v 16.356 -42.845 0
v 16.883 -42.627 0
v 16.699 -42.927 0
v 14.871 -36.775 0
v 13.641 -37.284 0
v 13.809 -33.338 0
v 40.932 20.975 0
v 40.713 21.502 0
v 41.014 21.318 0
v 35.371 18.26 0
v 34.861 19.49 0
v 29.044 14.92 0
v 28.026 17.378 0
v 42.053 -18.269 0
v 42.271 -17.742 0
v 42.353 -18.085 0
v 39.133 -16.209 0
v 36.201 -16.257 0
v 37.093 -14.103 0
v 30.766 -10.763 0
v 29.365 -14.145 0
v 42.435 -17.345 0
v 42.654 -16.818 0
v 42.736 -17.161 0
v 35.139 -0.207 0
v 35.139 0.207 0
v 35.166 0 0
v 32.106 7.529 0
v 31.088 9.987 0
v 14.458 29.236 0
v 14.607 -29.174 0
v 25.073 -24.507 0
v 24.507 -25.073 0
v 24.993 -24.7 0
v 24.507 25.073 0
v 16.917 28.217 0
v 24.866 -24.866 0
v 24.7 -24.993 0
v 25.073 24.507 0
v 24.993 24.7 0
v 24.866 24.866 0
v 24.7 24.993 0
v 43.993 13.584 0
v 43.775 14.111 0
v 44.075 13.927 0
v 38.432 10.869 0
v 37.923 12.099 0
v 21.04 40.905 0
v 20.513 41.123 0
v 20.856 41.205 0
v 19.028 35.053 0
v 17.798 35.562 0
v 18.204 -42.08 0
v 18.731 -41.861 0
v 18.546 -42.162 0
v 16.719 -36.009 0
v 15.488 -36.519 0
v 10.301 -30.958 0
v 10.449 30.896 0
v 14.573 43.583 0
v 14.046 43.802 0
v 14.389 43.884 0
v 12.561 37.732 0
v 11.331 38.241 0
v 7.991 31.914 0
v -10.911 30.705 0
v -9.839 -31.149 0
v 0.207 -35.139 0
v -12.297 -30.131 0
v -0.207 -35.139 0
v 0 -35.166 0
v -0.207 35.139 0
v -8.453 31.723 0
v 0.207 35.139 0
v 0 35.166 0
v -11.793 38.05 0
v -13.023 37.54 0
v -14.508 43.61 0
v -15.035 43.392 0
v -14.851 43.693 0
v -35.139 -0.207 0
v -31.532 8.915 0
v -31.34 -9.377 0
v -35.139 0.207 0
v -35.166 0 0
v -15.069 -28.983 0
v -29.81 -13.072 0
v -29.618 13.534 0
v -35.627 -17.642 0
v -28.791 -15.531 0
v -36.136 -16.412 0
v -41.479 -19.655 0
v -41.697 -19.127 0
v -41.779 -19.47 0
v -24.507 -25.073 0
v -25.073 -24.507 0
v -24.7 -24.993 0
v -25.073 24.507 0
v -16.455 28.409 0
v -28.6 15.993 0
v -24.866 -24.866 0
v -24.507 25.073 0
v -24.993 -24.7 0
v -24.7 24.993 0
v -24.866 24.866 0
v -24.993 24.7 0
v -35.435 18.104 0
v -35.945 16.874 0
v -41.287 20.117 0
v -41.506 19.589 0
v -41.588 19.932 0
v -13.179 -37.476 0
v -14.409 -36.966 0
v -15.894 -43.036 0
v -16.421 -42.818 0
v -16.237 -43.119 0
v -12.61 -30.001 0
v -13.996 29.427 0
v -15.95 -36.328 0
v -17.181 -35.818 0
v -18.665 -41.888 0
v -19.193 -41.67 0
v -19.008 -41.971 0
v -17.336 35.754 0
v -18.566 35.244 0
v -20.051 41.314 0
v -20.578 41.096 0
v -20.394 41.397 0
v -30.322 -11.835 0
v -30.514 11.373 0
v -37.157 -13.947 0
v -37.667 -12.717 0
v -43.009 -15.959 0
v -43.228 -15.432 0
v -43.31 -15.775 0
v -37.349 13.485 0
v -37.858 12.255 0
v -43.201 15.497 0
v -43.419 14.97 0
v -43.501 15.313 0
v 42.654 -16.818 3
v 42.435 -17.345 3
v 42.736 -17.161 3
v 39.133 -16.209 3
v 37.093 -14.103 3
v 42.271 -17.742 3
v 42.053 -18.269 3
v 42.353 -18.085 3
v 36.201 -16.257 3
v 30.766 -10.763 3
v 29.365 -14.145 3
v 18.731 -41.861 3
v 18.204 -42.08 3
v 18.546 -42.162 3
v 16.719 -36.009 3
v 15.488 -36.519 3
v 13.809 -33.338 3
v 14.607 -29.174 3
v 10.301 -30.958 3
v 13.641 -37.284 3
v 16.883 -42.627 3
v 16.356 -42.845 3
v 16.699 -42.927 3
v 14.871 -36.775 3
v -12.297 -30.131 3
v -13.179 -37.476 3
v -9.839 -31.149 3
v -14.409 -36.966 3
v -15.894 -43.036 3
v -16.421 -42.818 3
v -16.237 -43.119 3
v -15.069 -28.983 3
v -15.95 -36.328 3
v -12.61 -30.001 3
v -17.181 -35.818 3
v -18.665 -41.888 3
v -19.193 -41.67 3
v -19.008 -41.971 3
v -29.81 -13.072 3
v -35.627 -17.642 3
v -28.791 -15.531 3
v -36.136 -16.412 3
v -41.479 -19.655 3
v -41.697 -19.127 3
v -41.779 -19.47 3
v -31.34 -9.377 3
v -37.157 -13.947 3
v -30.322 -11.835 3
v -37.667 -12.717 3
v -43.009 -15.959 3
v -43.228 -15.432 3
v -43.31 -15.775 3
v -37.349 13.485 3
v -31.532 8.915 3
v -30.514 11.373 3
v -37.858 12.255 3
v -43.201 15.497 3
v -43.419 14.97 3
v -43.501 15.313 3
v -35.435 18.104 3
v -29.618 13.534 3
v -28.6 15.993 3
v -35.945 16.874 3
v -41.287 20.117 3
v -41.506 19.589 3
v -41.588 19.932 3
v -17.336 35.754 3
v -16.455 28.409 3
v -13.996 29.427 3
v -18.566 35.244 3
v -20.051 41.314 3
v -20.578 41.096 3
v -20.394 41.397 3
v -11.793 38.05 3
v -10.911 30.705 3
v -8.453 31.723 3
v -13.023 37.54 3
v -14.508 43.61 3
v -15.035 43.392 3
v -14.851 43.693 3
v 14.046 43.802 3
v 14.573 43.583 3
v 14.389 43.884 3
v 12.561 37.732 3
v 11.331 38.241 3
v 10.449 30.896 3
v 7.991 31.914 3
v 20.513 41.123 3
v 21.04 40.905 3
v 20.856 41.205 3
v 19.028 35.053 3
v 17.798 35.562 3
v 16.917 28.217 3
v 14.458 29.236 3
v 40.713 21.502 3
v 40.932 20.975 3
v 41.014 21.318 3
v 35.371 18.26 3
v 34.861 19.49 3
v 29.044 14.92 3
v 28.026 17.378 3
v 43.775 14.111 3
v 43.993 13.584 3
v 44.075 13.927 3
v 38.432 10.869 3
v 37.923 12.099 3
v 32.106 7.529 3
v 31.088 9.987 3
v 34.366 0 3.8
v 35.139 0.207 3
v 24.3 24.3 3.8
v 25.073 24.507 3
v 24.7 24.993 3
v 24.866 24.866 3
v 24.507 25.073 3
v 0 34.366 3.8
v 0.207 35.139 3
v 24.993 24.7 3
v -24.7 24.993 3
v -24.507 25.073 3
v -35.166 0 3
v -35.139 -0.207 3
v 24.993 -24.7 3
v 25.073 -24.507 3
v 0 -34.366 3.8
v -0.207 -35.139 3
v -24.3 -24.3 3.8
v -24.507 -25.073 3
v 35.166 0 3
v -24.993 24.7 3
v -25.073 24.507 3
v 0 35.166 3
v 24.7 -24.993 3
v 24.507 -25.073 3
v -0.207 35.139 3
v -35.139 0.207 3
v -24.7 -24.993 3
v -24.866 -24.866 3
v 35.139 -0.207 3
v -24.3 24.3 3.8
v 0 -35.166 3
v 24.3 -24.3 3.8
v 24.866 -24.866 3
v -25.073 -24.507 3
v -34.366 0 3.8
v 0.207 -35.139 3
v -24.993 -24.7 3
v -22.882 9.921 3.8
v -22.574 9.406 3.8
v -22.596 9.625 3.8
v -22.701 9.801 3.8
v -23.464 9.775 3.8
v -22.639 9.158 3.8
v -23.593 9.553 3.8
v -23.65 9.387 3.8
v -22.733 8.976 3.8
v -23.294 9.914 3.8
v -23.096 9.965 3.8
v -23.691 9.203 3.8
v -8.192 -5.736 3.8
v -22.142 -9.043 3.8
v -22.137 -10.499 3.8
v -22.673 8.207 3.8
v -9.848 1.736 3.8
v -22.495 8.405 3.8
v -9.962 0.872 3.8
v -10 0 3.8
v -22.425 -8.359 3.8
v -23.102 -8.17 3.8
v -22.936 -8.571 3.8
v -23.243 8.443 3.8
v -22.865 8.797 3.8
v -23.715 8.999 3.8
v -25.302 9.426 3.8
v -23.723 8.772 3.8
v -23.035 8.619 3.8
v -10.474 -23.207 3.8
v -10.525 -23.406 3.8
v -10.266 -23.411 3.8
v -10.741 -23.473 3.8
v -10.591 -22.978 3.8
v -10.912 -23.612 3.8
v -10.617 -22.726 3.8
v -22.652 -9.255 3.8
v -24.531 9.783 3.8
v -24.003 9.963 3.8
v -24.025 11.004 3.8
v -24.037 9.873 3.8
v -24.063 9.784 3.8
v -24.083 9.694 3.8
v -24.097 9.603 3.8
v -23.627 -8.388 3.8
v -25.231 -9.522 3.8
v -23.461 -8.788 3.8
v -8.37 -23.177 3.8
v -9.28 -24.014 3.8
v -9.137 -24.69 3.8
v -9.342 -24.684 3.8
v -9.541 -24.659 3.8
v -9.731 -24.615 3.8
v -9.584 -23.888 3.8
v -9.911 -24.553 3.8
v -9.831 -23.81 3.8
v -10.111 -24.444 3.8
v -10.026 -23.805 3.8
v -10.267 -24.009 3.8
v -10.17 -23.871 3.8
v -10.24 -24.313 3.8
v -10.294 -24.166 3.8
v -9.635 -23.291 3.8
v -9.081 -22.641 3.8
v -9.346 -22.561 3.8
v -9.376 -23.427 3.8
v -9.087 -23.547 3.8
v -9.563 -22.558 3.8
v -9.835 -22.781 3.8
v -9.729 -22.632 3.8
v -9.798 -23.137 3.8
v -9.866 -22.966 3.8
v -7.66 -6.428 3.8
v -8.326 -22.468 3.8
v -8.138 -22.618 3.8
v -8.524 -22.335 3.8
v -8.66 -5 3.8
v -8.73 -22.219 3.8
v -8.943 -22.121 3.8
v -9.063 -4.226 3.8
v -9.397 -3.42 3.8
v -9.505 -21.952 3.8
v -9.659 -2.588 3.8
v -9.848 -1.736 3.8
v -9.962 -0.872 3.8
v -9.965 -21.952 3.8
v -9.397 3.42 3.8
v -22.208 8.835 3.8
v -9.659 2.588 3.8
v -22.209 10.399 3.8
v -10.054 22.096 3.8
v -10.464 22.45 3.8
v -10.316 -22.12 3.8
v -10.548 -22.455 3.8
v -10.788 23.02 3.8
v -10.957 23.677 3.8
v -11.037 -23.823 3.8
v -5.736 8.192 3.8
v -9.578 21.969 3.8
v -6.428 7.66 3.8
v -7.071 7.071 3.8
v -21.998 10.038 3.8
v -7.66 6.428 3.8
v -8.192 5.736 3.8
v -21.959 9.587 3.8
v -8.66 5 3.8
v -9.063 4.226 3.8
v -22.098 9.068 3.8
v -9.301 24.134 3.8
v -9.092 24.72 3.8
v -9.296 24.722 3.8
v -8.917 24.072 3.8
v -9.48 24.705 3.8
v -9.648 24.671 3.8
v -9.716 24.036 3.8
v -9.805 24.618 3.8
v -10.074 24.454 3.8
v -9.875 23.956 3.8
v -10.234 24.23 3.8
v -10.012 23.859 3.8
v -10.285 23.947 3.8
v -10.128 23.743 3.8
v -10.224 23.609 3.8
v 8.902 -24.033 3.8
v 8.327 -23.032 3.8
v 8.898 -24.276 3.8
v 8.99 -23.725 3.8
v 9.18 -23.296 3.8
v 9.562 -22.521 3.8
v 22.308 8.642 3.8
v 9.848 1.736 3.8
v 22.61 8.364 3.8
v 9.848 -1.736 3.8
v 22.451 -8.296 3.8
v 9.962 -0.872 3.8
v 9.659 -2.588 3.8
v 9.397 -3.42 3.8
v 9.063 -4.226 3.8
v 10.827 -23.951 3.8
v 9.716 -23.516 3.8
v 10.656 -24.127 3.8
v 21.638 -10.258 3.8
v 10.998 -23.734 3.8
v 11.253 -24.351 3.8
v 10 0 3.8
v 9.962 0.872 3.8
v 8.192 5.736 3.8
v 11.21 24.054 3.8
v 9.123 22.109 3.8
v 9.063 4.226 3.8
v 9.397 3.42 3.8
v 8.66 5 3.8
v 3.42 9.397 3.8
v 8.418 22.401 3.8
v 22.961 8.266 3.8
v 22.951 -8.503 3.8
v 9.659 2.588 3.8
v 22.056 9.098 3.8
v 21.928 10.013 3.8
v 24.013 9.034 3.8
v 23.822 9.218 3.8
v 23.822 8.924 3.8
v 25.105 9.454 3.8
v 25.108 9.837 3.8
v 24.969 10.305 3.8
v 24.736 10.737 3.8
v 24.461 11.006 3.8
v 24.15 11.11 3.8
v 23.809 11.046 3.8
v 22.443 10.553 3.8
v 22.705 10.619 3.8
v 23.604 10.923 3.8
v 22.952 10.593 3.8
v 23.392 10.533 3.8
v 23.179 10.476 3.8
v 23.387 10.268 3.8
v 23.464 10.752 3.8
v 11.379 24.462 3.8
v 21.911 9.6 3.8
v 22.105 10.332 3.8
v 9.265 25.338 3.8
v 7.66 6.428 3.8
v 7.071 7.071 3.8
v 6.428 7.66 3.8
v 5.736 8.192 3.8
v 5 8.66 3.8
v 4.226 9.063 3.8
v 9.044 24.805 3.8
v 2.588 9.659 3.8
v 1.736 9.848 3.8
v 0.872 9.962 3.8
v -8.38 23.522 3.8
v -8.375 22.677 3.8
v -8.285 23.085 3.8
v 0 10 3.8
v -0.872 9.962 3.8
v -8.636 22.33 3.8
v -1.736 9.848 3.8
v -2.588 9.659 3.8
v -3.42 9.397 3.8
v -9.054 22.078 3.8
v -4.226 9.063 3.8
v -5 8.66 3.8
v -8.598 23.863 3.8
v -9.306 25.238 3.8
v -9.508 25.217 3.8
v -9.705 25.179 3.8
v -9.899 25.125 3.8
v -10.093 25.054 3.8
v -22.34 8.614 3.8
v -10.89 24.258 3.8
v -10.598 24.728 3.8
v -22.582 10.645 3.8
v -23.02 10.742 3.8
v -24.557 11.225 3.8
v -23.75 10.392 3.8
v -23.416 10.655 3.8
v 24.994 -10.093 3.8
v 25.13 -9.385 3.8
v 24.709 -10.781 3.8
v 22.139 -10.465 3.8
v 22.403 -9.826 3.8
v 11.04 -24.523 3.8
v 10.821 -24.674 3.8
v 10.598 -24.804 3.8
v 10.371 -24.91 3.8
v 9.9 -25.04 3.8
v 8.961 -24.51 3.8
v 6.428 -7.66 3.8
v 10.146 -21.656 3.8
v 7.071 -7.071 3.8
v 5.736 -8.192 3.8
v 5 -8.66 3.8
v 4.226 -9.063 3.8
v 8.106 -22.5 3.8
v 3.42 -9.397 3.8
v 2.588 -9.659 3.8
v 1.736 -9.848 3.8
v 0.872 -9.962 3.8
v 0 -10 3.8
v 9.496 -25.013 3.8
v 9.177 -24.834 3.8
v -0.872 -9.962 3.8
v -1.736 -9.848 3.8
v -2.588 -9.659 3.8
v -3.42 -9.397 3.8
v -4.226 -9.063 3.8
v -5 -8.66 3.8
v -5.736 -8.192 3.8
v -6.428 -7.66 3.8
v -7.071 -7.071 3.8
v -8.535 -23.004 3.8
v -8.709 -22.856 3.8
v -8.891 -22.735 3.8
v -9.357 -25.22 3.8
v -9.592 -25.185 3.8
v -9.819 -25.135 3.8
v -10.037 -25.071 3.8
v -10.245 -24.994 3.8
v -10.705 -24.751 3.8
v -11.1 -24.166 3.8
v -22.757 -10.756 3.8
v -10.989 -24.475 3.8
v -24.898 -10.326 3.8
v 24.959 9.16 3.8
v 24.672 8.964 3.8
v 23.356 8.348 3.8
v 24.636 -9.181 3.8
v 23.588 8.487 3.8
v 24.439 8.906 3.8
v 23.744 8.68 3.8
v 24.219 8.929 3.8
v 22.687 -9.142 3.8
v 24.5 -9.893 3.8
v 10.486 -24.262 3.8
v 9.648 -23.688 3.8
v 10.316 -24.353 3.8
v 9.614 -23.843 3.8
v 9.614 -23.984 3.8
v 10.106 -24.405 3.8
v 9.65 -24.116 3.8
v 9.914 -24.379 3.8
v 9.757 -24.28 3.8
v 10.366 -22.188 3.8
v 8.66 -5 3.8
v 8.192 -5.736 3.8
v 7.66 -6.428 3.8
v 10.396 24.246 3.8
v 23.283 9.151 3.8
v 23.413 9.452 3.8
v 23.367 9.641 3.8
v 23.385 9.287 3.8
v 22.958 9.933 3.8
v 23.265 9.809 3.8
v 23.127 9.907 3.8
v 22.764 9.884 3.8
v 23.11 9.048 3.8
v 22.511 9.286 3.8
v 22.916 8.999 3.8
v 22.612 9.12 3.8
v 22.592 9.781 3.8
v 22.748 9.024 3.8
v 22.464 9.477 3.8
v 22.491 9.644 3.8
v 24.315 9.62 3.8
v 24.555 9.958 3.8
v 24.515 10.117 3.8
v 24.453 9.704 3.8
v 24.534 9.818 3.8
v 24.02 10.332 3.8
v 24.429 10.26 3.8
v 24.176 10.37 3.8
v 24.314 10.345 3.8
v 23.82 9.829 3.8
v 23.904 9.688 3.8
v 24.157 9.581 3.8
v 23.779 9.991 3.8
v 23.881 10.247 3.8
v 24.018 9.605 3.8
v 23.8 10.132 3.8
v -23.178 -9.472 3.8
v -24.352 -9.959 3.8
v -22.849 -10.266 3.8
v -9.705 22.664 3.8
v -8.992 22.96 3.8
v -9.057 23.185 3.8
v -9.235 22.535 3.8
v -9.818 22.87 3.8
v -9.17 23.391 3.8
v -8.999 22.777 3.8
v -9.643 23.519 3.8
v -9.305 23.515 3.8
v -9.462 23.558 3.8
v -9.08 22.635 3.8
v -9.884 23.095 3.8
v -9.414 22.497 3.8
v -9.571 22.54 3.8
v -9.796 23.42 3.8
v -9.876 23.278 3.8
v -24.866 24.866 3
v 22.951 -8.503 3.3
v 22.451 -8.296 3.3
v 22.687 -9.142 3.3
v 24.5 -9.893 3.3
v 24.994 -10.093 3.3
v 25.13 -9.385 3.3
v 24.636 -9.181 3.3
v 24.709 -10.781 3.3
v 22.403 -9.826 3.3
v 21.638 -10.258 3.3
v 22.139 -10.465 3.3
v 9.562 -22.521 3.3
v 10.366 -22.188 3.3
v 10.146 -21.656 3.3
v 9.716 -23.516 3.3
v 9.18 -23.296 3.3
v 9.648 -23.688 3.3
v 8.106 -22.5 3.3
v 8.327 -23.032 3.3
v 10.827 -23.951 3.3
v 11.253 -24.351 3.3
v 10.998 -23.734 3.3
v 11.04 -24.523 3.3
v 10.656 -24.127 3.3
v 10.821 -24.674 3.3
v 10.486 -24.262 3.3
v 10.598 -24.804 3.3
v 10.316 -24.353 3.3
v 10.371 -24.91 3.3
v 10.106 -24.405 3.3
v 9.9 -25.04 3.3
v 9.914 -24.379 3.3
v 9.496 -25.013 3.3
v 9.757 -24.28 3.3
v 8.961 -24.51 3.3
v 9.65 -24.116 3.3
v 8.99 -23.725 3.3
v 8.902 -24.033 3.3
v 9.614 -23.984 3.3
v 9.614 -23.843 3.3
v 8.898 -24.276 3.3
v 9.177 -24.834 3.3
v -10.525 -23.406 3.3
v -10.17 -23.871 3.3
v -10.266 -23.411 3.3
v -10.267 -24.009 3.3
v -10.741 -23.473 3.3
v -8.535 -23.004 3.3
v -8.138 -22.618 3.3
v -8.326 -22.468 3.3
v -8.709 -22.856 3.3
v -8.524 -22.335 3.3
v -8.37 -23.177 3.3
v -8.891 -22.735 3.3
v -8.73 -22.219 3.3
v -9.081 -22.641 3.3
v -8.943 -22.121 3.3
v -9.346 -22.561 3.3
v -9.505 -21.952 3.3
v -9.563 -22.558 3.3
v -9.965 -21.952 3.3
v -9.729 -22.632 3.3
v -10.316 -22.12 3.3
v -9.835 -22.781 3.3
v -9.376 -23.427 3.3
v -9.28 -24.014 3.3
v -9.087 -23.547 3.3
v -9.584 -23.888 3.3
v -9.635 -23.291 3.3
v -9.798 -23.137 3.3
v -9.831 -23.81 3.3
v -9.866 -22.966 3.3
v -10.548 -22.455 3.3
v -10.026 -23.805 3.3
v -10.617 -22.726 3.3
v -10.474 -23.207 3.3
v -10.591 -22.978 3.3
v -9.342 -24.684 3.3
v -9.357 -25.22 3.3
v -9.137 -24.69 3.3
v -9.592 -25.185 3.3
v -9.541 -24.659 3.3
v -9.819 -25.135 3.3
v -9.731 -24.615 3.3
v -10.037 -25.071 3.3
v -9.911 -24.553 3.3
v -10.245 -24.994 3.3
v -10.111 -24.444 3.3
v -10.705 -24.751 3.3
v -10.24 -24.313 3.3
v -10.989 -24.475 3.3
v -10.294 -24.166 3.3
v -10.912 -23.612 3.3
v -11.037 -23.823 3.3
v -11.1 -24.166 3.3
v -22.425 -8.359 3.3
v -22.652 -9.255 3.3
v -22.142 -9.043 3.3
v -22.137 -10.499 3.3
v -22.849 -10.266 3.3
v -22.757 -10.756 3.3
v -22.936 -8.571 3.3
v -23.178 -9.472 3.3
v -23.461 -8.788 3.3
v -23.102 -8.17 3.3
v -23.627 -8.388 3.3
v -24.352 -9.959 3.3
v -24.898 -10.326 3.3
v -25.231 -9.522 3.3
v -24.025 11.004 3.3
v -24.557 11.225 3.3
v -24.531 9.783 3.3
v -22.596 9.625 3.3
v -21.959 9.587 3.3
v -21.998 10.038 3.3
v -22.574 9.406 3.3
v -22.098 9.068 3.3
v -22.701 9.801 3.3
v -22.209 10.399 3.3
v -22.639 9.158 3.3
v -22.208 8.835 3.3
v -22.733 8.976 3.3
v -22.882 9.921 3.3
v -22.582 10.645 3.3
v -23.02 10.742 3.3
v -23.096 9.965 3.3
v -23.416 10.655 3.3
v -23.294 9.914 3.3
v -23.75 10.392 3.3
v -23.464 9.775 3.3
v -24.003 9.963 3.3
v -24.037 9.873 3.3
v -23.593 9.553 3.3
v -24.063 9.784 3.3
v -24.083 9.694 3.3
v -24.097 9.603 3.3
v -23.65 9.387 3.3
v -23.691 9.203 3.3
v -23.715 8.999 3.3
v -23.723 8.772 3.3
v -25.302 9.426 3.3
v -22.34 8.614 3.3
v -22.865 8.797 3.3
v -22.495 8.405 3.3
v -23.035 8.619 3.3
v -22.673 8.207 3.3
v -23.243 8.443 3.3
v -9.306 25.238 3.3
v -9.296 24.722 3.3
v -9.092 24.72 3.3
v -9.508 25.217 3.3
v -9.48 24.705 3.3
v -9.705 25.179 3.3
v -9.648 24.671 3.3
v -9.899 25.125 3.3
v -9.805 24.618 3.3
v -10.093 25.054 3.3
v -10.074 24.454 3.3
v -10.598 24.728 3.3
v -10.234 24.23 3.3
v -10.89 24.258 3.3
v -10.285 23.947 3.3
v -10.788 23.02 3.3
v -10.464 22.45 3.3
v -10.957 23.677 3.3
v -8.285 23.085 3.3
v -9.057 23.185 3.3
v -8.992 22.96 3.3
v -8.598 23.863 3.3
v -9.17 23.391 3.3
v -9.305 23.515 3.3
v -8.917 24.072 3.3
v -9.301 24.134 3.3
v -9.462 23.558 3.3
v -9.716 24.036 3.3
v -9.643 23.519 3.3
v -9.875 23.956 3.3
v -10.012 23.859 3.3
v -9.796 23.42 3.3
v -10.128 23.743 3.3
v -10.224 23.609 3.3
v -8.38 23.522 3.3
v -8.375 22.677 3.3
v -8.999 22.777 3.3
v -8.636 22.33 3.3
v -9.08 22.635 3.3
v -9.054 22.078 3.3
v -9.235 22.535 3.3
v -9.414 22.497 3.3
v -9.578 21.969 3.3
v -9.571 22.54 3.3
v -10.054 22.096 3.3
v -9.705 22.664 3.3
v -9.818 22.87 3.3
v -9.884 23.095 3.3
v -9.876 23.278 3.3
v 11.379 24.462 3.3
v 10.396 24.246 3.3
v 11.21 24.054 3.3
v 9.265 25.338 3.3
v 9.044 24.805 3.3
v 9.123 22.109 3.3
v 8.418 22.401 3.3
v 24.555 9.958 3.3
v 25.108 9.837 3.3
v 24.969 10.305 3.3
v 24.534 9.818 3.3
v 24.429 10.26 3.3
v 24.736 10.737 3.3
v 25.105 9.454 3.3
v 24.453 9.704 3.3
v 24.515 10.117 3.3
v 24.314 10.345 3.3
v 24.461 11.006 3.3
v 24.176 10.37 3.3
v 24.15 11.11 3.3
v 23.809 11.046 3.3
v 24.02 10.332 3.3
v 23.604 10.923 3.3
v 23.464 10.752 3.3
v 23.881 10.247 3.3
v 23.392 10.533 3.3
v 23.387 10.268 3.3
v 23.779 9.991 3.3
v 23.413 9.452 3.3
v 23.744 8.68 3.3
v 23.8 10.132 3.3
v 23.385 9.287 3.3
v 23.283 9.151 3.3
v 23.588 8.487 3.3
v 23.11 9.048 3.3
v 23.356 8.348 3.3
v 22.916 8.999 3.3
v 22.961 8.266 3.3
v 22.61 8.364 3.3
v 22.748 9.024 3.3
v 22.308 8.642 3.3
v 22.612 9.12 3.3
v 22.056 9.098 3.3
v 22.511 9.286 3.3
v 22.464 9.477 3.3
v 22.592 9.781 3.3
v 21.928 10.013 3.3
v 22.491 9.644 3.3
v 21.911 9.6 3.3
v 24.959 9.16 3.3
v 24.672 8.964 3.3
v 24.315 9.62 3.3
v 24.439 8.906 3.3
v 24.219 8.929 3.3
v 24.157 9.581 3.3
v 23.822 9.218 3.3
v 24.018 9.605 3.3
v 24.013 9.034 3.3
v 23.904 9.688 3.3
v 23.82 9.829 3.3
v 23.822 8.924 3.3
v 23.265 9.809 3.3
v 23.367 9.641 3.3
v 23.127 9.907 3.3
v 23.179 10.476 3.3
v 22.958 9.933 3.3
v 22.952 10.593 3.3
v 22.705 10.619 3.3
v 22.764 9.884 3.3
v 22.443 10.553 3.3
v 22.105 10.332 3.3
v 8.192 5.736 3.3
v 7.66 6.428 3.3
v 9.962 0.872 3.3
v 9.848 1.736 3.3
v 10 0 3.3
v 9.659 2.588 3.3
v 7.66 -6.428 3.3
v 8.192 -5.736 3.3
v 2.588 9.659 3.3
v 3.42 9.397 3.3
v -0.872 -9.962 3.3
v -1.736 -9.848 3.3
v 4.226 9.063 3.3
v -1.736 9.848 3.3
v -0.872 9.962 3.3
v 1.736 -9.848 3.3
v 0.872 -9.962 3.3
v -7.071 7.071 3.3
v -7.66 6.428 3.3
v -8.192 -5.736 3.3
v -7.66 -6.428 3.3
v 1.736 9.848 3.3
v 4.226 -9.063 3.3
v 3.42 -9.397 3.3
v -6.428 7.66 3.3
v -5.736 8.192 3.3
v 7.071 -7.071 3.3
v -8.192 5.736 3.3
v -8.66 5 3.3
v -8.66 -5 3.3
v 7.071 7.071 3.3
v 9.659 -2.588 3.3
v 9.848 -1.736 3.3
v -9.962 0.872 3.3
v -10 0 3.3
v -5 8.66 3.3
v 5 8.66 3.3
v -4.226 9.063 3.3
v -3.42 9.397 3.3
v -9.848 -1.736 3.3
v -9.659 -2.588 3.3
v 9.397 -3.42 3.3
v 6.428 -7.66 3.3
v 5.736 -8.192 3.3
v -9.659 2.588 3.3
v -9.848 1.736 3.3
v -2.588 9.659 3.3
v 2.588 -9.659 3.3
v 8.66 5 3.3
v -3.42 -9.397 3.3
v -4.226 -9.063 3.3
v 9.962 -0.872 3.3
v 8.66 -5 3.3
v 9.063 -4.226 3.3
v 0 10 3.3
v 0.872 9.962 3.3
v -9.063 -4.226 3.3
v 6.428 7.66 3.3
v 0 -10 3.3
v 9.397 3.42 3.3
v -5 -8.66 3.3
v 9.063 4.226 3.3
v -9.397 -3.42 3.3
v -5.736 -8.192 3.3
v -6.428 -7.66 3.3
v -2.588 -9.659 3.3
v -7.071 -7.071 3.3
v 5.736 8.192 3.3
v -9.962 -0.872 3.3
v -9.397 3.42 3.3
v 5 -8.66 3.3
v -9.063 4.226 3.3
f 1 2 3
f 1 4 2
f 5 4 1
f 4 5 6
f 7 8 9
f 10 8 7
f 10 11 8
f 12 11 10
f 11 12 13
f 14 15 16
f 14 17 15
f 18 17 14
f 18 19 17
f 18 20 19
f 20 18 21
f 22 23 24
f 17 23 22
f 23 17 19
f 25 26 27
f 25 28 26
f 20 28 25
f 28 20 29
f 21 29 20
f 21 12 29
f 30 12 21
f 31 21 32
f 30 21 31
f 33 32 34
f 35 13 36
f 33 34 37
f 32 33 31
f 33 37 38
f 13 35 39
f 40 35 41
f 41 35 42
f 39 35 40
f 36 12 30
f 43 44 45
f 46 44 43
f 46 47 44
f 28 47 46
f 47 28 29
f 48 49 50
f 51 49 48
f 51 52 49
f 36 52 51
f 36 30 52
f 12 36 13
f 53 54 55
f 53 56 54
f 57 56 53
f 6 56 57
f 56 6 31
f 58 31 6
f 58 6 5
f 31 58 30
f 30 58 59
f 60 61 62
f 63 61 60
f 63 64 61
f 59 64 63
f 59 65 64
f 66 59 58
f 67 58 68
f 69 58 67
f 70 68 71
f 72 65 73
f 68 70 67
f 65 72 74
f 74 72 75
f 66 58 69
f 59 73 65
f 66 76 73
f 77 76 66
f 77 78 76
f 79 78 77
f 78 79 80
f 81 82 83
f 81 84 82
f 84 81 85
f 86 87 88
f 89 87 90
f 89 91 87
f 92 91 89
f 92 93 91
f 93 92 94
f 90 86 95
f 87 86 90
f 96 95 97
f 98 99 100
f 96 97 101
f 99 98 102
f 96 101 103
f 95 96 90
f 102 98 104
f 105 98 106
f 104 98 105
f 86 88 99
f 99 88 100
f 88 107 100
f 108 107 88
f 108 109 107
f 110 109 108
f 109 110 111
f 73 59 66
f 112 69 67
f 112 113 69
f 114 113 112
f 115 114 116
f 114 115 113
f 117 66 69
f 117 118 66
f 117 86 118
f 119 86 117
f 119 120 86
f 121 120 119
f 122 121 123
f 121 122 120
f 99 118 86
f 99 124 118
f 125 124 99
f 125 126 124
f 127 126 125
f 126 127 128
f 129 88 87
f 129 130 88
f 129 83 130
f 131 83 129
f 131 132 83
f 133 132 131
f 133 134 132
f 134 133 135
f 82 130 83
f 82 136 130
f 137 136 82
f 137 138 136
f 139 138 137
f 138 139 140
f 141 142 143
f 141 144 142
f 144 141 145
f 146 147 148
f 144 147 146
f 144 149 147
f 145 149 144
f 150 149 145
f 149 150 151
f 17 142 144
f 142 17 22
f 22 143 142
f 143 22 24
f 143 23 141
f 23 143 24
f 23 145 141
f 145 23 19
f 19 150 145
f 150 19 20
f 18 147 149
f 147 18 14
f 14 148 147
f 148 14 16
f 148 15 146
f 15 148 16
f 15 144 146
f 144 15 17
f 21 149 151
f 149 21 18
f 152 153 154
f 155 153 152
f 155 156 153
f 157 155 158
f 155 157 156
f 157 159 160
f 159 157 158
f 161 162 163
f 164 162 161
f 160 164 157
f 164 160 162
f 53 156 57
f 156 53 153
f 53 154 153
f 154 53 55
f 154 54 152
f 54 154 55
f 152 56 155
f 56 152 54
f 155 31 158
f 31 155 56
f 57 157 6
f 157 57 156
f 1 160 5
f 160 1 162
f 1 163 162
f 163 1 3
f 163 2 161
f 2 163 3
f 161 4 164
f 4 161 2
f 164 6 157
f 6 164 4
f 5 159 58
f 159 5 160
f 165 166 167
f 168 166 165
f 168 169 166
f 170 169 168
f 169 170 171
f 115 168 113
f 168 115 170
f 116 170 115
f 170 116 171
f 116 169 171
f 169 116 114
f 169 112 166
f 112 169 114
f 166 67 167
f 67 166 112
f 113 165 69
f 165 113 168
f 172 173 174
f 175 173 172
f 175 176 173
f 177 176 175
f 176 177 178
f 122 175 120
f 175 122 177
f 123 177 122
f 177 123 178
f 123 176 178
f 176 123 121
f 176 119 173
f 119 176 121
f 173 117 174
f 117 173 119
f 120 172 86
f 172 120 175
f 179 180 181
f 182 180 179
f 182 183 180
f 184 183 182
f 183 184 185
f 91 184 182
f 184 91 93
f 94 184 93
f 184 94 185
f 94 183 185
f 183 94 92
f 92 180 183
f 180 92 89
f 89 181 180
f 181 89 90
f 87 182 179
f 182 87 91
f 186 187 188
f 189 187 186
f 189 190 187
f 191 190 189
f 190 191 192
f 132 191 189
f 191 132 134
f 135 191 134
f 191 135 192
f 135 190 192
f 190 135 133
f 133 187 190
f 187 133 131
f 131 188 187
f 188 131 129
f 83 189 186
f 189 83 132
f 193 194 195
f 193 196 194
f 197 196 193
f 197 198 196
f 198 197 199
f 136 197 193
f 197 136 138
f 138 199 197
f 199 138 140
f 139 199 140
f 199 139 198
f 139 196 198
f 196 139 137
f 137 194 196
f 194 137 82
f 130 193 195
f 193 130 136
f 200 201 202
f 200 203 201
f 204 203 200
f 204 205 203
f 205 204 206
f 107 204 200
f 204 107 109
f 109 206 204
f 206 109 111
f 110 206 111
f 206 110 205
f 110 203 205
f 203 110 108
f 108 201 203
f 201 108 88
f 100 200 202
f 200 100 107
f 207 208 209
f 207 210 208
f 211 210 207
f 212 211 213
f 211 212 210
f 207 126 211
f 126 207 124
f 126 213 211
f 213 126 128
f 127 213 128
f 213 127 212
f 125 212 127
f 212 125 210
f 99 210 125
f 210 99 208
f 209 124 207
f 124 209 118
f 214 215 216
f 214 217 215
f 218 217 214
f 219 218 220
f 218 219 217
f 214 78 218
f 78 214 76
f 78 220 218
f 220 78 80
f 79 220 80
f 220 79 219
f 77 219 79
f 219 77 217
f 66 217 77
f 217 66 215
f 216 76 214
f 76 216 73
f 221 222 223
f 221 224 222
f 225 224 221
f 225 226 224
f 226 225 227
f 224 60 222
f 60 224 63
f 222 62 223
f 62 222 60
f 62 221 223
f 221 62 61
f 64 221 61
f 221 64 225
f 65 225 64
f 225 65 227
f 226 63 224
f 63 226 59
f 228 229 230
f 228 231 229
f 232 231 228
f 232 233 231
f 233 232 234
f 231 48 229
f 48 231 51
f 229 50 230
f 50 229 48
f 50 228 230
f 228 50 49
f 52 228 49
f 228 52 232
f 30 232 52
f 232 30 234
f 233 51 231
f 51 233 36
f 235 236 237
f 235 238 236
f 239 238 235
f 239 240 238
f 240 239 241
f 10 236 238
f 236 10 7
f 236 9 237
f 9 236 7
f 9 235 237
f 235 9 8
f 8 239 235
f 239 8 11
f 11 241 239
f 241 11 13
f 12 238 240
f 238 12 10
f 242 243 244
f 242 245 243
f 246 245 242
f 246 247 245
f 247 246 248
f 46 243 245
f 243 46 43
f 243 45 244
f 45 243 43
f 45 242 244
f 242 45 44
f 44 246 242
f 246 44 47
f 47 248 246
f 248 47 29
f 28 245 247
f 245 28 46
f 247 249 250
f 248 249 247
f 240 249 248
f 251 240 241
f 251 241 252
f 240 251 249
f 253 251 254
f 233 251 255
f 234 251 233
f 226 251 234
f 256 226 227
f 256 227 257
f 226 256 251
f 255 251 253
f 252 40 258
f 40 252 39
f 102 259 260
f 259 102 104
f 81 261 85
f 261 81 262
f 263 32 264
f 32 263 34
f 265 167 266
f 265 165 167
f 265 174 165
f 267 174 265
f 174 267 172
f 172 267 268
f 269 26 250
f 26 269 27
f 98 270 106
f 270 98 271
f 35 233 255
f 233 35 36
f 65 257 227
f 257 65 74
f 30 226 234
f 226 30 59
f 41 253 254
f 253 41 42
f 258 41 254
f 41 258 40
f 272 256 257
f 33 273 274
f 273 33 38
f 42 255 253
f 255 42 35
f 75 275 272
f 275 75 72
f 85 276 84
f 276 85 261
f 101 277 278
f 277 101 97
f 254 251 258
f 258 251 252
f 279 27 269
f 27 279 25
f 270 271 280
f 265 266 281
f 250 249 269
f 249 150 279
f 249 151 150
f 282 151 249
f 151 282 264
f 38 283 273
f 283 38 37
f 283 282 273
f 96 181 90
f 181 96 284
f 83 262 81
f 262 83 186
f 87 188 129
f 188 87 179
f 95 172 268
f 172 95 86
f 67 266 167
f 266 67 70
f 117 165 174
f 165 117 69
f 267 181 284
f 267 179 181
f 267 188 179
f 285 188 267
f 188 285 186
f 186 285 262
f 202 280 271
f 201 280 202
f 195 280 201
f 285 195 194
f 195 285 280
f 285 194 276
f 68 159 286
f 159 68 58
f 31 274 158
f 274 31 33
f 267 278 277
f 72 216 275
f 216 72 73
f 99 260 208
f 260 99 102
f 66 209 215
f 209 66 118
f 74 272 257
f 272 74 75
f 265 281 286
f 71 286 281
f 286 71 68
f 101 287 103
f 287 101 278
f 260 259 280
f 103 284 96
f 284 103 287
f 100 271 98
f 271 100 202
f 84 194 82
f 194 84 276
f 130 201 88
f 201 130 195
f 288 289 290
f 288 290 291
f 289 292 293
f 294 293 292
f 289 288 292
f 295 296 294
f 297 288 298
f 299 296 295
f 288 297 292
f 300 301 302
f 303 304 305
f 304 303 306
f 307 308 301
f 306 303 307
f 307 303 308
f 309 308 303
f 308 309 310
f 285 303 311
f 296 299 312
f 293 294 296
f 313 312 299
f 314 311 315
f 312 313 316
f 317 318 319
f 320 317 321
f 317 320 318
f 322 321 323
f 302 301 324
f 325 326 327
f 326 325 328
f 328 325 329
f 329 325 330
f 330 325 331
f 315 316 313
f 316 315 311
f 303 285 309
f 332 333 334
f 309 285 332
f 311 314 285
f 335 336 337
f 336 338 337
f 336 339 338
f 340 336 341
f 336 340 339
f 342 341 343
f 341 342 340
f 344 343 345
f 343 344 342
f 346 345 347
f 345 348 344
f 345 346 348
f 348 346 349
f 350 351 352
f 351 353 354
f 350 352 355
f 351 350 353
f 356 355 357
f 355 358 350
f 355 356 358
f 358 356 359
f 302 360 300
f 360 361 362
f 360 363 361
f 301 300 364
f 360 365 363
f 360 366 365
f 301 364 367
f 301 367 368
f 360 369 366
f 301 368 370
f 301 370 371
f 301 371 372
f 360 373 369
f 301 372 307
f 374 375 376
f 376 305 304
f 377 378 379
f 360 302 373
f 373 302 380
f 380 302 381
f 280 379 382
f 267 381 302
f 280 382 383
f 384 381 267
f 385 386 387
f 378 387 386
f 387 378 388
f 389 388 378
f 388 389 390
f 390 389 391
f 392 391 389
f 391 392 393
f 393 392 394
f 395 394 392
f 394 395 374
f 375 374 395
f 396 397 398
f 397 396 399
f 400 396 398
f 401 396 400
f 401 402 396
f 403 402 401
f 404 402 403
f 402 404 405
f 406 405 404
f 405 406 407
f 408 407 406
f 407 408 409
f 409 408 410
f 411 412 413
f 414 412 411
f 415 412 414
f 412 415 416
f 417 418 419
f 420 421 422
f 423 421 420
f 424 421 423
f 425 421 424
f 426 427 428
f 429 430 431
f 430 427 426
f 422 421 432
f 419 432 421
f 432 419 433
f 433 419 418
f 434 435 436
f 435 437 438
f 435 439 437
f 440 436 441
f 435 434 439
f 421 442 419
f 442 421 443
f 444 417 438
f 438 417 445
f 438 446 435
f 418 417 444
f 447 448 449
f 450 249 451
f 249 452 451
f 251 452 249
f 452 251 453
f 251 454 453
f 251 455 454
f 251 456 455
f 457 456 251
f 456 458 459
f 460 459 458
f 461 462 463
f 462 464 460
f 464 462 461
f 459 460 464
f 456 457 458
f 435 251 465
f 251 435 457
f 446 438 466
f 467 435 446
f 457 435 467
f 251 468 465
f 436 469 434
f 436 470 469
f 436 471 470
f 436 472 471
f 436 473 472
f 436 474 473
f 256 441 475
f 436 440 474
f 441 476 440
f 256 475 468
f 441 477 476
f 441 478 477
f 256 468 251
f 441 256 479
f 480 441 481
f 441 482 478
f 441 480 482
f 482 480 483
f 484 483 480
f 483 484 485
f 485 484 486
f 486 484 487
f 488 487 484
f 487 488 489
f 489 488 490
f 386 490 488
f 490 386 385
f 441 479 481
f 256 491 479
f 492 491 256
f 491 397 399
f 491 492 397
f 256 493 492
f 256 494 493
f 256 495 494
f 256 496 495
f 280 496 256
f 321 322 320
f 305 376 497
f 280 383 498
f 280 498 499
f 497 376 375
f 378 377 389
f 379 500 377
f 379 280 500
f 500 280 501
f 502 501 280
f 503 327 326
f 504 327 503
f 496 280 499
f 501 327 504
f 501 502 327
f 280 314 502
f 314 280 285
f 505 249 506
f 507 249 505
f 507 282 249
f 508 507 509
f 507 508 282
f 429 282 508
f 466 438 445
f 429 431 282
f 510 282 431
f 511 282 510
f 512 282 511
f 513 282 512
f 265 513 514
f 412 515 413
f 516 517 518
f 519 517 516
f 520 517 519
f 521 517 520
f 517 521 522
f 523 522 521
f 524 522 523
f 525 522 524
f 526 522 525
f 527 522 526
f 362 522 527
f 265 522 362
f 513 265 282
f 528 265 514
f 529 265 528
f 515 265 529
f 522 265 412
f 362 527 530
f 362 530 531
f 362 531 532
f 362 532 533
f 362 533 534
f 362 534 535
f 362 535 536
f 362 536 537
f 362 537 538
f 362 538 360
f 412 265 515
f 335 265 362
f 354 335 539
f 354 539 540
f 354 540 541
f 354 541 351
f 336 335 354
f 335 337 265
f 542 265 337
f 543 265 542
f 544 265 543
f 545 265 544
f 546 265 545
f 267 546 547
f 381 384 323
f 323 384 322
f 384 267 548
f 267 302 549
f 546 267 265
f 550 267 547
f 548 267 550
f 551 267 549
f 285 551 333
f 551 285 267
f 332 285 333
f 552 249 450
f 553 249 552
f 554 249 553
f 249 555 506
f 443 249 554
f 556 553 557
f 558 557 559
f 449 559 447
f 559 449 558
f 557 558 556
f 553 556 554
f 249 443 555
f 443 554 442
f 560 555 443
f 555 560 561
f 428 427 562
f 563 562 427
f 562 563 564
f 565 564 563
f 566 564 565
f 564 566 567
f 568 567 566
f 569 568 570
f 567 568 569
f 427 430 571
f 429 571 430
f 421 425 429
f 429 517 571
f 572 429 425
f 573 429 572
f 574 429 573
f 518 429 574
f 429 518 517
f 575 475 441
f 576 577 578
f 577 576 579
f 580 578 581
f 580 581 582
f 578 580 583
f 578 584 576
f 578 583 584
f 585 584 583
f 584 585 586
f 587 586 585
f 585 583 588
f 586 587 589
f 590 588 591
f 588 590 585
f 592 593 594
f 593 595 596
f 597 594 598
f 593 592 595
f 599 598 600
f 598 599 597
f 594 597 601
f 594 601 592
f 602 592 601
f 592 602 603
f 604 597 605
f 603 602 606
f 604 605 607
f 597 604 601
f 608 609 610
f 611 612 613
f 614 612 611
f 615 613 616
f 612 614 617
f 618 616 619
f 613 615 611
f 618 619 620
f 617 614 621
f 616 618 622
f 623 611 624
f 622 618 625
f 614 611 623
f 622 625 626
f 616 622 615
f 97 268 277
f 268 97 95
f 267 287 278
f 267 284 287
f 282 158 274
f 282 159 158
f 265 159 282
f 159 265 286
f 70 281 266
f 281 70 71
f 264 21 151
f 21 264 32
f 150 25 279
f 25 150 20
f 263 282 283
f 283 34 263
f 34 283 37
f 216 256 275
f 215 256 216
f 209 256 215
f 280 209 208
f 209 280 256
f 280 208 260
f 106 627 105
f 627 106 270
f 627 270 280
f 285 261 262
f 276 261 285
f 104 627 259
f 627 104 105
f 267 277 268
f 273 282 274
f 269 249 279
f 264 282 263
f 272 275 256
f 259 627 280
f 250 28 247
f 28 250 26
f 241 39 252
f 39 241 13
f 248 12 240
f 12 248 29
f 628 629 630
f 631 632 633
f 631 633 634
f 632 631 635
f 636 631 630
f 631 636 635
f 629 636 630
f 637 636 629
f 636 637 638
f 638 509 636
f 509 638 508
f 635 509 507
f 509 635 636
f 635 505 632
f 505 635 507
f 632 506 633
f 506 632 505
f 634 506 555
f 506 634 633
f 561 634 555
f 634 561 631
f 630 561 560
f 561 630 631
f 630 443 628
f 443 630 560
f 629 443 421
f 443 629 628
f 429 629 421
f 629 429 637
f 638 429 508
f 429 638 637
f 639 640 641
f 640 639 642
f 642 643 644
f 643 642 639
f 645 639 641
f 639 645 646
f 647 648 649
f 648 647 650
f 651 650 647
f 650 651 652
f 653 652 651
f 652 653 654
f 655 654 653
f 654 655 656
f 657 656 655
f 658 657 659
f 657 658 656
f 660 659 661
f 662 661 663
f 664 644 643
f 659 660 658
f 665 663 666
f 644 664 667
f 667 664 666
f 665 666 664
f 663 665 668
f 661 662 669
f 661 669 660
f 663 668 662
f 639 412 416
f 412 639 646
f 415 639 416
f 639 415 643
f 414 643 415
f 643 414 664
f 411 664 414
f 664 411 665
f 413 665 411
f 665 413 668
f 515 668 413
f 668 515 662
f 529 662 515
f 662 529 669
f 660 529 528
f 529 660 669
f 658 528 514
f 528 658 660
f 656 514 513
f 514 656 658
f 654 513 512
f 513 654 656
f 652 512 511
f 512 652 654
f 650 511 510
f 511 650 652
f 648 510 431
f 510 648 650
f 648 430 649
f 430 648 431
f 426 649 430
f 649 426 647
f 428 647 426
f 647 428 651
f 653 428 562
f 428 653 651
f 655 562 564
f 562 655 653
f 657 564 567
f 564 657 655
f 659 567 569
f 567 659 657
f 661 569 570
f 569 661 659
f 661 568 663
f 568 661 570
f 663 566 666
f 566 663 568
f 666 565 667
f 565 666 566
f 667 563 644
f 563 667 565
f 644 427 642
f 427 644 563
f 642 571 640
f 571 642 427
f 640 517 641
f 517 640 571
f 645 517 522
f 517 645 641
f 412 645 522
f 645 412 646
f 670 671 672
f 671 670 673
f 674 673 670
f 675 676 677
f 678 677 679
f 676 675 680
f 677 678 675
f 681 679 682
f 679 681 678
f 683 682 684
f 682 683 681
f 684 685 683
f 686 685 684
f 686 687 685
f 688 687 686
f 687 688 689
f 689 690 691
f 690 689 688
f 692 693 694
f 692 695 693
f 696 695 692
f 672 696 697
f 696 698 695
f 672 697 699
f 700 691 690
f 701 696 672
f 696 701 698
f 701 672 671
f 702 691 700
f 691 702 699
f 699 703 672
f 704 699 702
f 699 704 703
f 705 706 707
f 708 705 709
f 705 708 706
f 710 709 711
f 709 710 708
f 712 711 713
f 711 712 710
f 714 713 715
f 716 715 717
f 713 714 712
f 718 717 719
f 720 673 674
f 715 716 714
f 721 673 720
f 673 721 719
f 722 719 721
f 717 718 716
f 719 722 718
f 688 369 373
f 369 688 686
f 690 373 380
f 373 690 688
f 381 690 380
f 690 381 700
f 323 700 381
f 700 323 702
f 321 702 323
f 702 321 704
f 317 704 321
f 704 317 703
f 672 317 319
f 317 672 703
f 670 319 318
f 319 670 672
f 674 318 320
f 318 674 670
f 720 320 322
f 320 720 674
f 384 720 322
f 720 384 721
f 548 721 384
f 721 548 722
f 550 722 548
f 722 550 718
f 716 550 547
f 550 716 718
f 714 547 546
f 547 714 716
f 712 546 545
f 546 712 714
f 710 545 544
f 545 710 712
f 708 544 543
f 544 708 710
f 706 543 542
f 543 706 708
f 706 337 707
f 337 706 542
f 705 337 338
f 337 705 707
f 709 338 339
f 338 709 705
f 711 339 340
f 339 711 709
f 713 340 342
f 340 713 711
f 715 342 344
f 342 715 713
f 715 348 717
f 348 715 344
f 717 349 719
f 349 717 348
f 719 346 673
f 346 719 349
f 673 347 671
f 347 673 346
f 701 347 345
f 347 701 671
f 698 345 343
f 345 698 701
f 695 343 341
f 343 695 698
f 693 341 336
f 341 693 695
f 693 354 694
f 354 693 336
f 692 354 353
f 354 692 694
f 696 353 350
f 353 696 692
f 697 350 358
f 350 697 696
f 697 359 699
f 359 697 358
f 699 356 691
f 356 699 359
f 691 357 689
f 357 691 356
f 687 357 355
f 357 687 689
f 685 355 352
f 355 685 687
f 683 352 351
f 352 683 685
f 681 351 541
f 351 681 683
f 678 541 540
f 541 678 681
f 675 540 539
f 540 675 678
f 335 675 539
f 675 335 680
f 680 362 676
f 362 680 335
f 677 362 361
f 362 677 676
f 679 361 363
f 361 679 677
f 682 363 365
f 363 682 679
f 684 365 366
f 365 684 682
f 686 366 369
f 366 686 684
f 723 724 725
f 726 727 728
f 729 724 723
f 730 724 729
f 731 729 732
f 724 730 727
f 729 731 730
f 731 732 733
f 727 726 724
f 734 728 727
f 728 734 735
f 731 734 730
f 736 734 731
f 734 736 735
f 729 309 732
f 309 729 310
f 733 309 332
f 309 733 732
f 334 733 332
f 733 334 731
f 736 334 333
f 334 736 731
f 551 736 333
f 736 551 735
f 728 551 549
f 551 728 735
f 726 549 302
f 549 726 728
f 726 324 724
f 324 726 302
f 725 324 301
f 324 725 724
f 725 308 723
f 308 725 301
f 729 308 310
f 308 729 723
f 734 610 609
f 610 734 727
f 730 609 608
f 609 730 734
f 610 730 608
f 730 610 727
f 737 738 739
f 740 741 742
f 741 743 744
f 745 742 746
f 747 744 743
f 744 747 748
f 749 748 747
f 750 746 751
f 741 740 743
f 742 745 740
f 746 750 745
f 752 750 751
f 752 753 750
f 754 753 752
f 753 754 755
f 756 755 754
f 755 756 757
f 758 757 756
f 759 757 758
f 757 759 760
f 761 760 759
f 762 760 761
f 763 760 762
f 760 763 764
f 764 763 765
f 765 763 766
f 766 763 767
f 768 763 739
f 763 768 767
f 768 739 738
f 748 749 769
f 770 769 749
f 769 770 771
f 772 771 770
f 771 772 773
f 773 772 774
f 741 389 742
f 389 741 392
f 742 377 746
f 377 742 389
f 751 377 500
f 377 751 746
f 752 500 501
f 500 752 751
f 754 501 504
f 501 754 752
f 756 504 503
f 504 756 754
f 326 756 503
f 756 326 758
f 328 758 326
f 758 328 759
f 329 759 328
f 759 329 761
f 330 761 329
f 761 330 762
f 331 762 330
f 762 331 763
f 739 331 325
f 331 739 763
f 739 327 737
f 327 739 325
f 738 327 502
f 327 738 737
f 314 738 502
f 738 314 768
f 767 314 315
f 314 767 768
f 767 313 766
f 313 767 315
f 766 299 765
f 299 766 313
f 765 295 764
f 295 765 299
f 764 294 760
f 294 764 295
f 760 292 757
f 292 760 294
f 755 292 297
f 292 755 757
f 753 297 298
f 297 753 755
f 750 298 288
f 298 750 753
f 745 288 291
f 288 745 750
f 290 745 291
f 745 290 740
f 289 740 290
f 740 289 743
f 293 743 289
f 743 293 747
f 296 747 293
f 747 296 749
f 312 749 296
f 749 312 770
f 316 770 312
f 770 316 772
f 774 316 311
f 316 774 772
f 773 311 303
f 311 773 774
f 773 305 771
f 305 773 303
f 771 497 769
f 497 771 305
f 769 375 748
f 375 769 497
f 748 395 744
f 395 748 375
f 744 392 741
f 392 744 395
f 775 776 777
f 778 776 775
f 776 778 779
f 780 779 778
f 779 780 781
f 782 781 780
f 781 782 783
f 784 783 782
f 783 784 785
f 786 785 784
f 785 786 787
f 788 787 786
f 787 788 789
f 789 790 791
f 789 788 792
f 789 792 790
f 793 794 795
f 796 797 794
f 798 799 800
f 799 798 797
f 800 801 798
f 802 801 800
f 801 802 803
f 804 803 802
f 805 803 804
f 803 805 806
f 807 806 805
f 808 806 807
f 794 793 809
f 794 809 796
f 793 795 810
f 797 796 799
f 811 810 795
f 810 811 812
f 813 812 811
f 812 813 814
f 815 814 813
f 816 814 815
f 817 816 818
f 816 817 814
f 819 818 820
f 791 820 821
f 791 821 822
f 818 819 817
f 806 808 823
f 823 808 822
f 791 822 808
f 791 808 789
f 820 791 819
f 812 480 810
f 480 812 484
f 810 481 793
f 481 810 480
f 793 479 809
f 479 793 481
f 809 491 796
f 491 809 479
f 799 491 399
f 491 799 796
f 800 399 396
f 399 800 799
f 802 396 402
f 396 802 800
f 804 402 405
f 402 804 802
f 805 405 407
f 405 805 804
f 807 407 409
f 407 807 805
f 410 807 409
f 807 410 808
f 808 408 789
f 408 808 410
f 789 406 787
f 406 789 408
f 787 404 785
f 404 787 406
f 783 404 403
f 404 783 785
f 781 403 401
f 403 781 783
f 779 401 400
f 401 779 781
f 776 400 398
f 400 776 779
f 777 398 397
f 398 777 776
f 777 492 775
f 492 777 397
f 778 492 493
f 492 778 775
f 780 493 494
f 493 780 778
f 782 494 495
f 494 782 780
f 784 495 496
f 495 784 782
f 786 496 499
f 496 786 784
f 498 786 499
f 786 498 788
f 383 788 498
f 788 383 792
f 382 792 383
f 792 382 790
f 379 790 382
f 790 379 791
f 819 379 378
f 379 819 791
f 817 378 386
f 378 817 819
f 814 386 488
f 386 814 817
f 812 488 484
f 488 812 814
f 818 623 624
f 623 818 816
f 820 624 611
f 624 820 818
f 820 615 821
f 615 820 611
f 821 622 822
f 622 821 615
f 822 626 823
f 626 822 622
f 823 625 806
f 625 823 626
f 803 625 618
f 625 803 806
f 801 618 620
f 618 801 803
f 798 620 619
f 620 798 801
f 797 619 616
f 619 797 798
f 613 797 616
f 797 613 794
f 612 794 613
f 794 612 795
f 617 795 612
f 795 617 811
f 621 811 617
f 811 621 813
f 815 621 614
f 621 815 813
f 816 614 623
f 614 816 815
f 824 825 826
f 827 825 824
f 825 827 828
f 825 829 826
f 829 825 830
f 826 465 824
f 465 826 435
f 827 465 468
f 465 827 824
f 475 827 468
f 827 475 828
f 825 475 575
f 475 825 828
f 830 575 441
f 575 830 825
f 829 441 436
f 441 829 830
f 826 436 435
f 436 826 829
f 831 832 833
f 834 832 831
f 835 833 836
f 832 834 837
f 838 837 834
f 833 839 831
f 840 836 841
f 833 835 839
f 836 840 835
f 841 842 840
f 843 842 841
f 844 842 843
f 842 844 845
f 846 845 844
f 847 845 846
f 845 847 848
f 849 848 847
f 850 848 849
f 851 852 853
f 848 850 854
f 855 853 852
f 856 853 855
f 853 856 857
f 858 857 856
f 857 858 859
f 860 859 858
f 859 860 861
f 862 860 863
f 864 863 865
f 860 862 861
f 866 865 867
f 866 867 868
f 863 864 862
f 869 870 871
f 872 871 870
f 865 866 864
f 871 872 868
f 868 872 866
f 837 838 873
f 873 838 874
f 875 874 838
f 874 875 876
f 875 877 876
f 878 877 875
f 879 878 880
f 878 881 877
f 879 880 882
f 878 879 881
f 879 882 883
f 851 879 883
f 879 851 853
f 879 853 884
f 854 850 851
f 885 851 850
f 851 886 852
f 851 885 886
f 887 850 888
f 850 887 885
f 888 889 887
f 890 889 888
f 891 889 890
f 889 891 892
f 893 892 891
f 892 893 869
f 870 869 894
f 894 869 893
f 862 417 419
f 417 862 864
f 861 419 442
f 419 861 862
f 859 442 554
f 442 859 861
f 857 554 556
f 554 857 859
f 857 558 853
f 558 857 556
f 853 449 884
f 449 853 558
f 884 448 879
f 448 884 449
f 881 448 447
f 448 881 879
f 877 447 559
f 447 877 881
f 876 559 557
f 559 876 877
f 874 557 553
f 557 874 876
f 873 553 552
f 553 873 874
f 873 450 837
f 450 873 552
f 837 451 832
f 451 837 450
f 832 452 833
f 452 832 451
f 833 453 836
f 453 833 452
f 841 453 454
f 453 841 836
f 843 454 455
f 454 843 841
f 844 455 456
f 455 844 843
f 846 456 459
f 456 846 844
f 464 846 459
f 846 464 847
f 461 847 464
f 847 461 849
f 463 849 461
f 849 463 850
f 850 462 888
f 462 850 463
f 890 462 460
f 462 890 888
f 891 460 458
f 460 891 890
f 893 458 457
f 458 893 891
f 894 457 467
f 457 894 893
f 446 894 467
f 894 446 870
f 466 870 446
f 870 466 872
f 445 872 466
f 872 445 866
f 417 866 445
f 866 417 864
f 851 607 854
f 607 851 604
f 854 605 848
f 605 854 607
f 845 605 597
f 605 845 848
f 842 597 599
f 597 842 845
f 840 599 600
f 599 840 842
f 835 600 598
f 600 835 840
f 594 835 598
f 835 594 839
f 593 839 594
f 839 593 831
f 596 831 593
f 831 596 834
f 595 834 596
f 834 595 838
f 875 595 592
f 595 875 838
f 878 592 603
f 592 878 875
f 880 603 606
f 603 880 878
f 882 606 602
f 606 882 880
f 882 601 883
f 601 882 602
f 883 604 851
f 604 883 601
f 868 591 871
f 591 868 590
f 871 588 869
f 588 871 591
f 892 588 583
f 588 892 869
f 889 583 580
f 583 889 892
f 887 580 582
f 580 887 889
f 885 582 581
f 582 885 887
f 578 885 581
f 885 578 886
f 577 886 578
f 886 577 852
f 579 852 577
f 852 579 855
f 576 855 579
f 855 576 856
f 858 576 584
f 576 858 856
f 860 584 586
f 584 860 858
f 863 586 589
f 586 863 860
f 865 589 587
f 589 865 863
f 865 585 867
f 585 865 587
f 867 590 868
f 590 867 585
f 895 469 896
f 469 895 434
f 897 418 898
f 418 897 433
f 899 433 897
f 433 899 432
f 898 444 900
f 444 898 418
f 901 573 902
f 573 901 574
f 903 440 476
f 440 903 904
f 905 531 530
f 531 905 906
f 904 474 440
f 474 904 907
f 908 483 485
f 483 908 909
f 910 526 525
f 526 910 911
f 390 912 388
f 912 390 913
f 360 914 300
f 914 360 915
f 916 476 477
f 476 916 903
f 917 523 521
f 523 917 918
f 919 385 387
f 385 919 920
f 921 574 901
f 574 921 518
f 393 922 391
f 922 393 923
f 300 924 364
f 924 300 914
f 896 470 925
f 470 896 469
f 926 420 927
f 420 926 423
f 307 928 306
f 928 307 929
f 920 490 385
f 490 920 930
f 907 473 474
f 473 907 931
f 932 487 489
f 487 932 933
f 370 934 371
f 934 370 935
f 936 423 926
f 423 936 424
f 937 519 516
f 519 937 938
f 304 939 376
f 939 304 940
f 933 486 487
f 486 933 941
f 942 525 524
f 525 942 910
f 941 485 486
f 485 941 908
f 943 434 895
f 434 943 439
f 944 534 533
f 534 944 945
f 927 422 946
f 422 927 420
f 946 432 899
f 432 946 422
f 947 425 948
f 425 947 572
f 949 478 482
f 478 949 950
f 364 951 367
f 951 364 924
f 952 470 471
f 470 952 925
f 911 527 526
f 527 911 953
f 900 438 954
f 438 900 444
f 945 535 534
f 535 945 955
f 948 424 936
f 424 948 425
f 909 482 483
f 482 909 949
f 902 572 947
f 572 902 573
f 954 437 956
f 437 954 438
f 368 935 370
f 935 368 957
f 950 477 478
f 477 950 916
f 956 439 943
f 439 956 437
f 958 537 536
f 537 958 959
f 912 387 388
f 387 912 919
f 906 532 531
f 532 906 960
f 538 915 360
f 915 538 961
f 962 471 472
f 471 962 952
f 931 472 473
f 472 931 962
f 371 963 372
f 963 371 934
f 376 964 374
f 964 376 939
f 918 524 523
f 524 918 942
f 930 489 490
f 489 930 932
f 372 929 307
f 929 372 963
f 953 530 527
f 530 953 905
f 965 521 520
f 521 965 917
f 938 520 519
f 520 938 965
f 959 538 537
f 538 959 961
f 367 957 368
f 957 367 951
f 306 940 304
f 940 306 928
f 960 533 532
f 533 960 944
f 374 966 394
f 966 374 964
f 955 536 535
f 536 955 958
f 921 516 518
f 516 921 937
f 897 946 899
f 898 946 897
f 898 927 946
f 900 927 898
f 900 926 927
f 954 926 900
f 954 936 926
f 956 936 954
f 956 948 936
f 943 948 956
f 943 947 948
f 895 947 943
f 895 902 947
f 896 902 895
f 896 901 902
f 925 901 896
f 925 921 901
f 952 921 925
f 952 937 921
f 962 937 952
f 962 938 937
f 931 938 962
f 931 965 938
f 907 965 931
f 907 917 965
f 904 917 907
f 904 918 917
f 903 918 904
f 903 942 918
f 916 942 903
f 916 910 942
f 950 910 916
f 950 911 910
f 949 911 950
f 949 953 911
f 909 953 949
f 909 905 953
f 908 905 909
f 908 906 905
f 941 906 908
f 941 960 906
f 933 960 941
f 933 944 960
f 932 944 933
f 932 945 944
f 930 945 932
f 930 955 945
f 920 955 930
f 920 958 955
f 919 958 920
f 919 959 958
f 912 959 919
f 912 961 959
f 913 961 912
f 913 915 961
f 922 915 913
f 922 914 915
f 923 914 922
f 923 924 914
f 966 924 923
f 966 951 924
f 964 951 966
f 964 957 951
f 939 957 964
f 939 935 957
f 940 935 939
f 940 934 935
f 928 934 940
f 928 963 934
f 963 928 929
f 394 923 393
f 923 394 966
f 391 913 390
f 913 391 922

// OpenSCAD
// 2-Point Discrimination Wheel — parametric n-gon, clockwise order
distances_mm       = is_undef(distances_mm) ? [1, 2,3,4,5,6,7,8] : distances_mm;
outer_flat_to_flat = is_undef(outer_flat_to_flat) ? 63.5 : outer_flat_to_flat;
base_thickness     = is_undef(base_thickness) ? 3.0 : base_thickness;
spike_length  = is_undef(spike_length) ? 14 : spike_length;
base_d        = is_undef(base_d) ? 3 : base_d;
shank_d       = is_undef(shank_d) ? 1.4 : shank_d;
tip_d         = is_undef(tip_d) ? 0.6 : tip_d;
root_overlap  = is_undef(root_overlap) ? 0.7 : root_overlap;
label_size    = is_undef(label_size) ? 3 : label_size;
label_depth   = is_undef(label_depth) ? 0.5 : label_depth;
font_name     = is_undef(font_name) ? "DejaVu Sans:style=Bold" : font_name;
label_radial  = is_undef(label_radial) ? 0.80 : label_radial;
hub_diameter  = is_undef(hub_diameter) ? 20 : hub_diameter;
thumb_depth   = is_undef(thumb_depth) ? 0.5 : thumb_depth;
chamfer = is_undef(chamfer) ? 0.8 : chamfer;
$fn = is_undef($fn) ? 72 : $fn;

module soft_chamfer(h=chamfer){
  if (h>0) minkowski(){ children(); cylinder(h=h,r1=h,r2=0,$fn=24); }
  else children();
}
function apothem(across_flats,n)=across_flats/2;
function circ_radius(across_flats,n)=across_flats/(2*cos(180/n));
function total_thickness()=base_thickness+max(chamfer,0);

module polygon_plate(n, across_flats, thk){
  r=circ_radius(across_flats,n);
  soft_chamfer()
    linear_extrude(thk)
      polygon(points=[for(i=[0:n-1]) let(a=360*i/n)[r*cos(a),r*sin(a)]]);
}

module spike_single_flat(len=spike_length,bd=base_d,sd=shank_d,td=tip_d){
  base_r=bd/2; shank_r=sd/2; tip_r=td/2;
  bx=-root_overlap; sx=len*0.55; tx=len;
  linear_extrude(height=base_thickness)
  union(){
    translate([bx,0]) circle(r=base_r);
    hull(){translate([bx,0])circle(r=base_r);translate([sx,0])circle(r=shank_r);}
    hull(){translate([sx,0])circle(r=shank_r);translate([tx,0])circle(r=tip_r);}
  }
}

module thumb_well_top(){
  translate([0,0,total_thickness()-thumb_depth])
    cylinder(h=thumb_depth,d=hub_diameter,$fn=72);
}

module edge_numbers_top(distances,a){
  n=len(distances);
  for(i=[0:n-1]){
    angN=-360*(i+0.5)/n;
    translate([(label_radial*a)*cos(angN),
               (label_radial*a)*sin(angN),
               total_thickness()-label_depth])
      rotate([0,0,angN-90])
        linear_extrude(height=label_depth)
          text(str(distances[i]),
               size=label_size,font=font_name,
               halign="center",valign="center");
  }
}

module wheel_solid(distances){
  n=len(distances);
  a=apothem(outer_flat_to_flat,n);
  union(){
    polygon_plate(n,outer_flat_to_flat,base_thickness);
    for(i=[0:n-1]){
      angN=-360*(i+0.5)/n;
      translate([a*cos(angN),a*sin(angN),0])
        rotate([0,0,angN]){
          sep=distances[i];
          translate([0,+sep/2,0])spike_single_flat();
          translate([0,-sep/2,0])spike_single_flat();
        }
    }
  }
}

module discriminator(distances){
  n=len(distances);
  assert(n>=3,"distances_mm must have at least 3 entries.");
  difference(){
    wheel_solid(distances);
    thumb_well_top();
    edge_numbers_top(distances,apothem(outer_flat_to_flat,n));
  }
}

discriminator(distances_mm);
